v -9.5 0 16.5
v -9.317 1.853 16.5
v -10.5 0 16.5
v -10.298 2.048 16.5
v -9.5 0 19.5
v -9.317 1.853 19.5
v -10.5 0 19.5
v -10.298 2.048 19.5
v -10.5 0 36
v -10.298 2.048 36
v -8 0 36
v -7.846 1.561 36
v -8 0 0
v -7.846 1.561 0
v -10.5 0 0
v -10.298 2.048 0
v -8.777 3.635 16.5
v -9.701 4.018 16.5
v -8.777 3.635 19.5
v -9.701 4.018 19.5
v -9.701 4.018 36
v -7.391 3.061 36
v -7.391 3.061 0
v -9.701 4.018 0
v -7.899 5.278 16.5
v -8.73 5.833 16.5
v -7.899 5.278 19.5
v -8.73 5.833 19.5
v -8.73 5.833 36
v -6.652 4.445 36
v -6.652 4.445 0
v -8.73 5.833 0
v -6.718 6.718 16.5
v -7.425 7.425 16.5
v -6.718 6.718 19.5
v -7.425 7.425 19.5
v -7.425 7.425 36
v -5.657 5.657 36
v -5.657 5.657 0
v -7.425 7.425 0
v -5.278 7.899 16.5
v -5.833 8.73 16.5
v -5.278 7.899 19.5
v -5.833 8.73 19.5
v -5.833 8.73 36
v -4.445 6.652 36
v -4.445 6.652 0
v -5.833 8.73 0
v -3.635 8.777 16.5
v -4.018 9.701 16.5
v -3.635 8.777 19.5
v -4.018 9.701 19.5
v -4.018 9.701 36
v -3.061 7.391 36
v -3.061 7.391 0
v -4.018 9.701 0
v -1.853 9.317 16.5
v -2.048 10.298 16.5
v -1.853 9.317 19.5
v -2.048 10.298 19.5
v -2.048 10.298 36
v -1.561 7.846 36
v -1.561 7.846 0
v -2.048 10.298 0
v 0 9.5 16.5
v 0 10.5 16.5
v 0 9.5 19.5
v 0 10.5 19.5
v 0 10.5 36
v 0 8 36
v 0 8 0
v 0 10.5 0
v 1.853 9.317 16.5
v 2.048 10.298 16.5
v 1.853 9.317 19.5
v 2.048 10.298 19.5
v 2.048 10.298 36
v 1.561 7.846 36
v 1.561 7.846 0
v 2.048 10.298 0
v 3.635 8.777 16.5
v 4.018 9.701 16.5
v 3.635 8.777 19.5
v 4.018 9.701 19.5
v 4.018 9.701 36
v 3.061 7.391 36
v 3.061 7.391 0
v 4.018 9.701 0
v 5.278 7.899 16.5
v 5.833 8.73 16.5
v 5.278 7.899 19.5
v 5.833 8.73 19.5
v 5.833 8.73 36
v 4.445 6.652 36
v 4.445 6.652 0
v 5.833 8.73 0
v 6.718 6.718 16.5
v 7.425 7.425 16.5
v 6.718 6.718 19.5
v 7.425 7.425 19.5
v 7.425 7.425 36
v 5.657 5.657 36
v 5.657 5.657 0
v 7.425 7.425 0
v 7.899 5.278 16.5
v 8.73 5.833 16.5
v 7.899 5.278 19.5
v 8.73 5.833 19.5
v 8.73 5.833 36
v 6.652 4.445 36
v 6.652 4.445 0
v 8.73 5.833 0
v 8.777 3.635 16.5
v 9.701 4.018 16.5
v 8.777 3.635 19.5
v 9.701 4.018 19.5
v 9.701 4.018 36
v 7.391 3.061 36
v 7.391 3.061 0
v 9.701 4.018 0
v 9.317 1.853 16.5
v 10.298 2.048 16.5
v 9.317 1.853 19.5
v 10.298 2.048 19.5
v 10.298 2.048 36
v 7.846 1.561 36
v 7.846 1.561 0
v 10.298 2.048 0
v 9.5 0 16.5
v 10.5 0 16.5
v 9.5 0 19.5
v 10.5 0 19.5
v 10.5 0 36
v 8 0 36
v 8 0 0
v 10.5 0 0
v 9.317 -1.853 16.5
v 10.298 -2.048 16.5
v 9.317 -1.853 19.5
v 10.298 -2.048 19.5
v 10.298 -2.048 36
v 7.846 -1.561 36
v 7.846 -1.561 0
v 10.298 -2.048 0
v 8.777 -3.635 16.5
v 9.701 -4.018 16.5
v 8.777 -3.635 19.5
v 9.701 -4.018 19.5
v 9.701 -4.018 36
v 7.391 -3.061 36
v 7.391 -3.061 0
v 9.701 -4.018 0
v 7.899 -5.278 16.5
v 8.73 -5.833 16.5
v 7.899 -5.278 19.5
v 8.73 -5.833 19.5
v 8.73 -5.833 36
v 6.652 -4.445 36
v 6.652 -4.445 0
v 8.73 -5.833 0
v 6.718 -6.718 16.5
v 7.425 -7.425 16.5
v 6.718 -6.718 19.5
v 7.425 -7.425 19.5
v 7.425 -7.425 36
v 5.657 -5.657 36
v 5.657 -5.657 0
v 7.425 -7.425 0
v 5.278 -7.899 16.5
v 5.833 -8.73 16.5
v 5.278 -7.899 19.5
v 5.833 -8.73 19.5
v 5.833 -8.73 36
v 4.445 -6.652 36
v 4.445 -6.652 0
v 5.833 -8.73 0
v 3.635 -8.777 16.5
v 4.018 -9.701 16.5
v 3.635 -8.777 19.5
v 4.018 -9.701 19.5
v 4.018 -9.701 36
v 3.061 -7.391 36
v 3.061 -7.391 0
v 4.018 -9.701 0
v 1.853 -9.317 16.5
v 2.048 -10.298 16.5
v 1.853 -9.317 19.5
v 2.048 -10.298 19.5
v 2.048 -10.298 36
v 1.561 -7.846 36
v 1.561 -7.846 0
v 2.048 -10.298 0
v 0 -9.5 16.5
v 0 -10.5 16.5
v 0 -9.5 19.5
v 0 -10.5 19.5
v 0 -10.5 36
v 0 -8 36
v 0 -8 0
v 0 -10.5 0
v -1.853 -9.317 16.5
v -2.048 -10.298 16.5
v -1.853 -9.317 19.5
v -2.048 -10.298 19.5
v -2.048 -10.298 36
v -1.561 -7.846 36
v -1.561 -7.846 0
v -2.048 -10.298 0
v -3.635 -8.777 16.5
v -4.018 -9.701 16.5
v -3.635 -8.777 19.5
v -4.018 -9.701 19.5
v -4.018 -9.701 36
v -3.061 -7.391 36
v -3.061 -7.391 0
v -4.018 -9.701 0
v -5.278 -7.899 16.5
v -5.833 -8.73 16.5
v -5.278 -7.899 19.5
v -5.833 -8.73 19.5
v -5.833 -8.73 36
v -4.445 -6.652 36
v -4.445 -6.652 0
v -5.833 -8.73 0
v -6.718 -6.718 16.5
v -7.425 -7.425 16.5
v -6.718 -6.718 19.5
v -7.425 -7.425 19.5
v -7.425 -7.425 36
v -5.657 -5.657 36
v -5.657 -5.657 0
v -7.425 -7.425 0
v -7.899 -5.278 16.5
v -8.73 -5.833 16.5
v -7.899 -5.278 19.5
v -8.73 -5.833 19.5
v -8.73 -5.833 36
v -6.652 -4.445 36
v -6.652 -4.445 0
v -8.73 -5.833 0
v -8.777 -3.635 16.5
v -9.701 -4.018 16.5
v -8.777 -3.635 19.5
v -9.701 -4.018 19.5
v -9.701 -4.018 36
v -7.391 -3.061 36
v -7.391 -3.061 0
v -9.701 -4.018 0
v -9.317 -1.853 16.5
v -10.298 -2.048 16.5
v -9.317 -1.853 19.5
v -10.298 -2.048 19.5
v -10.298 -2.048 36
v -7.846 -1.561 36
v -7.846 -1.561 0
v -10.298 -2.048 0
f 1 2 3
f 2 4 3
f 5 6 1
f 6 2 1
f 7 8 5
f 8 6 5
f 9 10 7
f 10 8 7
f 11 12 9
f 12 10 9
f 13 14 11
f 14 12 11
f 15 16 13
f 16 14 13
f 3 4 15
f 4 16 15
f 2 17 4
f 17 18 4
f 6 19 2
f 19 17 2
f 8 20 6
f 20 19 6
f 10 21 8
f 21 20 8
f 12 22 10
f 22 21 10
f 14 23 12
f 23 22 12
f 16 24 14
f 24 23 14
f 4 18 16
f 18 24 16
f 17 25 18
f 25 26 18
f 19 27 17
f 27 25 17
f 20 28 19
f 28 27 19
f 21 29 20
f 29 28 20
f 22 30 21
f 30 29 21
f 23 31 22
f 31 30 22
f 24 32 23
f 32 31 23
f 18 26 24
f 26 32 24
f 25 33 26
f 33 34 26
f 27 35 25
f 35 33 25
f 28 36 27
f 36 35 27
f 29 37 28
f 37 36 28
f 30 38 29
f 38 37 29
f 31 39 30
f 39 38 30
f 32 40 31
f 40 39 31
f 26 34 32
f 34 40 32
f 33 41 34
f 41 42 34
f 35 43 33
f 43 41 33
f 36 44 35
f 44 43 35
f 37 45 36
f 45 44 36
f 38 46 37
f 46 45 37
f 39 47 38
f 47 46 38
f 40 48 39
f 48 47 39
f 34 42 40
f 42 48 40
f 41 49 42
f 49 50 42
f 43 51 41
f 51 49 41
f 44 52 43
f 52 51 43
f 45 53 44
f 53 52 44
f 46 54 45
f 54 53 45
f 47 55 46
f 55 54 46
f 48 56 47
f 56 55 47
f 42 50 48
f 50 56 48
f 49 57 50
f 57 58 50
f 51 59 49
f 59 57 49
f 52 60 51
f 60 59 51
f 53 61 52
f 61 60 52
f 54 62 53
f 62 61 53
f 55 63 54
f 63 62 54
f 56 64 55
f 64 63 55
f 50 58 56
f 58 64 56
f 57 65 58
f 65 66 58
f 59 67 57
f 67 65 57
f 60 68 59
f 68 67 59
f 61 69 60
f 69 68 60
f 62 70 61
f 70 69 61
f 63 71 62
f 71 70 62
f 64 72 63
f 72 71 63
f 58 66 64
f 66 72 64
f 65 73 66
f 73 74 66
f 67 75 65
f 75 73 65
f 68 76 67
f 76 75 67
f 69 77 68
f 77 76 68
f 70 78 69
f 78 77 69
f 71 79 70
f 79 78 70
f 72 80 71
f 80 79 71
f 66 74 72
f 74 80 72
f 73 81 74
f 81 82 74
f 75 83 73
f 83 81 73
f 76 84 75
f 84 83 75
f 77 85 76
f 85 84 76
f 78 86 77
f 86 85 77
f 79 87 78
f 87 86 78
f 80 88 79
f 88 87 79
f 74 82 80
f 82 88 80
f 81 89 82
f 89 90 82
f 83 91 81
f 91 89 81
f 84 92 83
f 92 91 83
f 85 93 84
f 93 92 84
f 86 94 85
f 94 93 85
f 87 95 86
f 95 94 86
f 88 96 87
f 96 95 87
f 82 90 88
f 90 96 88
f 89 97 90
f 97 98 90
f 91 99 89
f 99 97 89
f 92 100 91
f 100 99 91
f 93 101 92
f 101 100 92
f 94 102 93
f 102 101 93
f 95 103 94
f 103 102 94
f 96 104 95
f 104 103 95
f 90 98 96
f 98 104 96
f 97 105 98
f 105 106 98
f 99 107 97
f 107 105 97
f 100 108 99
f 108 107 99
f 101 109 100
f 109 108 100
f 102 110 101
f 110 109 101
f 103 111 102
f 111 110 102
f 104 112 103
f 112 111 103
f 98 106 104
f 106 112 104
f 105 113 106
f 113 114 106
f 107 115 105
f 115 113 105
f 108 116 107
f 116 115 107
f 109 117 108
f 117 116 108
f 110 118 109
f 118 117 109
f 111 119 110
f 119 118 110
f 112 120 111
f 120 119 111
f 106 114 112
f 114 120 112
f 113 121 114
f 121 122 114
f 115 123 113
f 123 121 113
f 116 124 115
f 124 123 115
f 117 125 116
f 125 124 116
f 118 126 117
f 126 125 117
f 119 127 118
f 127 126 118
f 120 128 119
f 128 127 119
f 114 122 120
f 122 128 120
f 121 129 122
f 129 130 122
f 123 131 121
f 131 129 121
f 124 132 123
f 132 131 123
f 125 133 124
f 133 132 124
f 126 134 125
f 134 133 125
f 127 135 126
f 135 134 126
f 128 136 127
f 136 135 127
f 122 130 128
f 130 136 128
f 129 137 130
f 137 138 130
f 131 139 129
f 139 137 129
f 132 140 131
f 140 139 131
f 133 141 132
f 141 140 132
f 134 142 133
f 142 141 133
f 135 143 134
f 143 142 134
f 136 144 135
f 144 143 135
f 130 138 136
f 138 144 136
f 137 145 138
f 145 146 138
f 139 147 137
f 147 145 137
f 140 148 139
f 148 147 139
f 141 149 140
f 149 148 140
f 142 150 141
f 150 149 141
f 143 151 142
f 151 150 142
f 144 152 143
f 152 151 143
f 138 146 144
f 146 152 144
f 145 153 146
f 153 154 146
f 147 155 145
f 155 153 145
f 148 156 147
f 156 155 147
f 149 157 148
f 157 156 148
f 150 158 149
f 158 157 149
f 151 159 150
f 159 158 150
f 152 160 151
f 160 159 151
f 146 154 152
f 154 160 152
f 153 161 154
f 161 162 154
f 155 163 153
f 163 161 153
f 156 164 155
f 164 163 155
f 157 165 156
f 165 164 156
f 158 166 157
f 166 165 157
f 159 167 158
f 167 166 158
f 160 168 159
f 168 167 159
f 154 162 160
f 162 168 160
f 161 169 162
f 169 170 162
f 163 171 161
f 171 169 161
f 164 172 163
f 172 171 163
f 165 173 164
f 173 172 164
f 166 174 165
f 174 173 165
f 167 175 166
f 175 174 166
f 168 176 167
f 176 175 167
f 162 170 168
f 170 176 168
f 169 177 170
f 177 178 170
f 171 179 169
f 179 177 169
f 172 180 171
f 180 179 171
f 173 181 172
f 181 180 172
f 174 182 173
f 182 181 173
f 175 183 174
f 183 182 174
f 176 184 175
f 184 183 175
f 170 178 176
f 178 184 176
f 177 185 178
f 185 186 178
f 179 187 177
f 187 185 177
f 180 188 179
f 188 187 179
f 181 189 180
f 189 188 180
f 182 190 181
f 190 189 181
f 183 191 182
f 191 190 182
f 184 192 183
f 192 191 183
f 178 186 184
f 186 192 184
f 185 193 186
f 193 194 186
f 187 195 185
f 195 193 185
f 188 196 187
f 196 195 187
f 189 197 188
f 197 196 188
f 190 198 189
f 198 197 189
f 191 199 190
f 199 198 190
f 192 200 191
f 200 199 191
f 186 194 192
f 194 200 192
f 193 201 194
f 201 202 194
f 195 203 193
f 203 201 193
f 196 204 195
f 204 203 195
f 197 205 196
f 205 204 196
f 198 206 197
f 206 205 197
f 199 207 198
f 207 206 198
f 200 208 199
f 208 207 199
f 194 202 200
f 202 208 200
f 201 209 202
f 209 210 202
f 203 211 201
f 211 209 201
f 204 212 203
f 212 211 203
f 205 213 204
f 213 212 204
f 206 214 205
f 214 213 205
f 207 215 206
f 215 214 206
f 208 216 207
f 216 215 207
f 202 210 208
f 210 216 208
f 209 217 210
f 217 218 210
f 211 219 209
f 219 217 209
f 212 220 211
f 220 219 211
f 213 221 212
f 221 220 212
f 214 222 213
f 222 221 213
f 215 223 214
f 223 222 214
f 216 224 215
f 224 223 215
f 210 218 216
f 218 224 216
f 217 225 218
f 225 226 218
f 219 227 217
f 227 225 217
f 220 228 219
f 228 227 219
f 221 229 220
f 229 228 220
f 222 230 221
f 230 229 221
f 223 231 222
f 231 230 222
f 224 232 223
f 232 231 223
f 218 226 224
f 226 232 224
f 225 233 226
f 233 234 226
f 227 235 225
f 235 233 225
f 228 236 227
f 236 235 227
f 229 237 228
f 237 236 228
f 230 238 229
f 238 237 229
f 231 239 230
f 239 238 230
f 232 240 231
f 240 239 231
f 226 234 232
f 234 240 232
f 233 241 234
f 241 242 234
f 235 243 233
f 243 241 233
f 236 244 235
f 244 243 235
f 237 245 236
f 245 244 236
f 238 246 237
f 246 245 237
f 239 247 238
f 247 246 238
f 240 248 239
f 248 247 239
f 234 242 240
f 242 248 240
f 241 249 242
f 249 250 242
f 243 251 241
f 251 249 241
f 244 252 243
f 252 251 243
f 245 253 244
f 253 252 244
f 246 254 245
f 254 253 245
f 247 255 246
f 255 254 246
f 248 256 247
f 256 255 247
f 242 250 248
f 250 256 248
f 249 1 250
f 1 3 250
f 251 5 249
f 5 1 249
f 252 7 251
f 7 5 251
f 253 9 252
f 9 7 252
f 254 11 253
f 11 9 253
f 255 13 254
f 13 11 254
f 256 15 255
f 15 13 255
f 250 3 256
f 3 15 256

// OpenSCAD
$fn = 32;

// ----------------------------------------------------------------------
// Grooved revolve: stepped, bore R8
// ----------------------------------------------------------------------

// --- parameters (mm) ---
bore_r = 8;               // bore radius
outer_r = 10.5;           // outer radius of the body
total_h = 36;             // overall height, Z
wall = 2.5;               // radial wall thickness
groove_w = 3;             // groove width
groove_d = 1;             // groove depth
grooves = 1;              // number of outer grooves
fit_tol = 0.1;            // declared fit tolerance (prompt contract)
free_tol = 0.5;           // declared free tolerance (prompt contract)

bbox_x = 2 * outer_r;  // full diameter
bore_d = 2 * bore_r;  // bore diameter
body_d = 2 * outer_r;  // body diameter
revolve_angle = 360;  // full turn around the Z axis

profile = [[8, 0], [10.5, 0], [10.5, 16.5], [9.5, 16.5], [9.5, 19.5], [10.5, 19.5], [10.5, 36], [8, 36]];  // primary outline, 8 points, counter clockwise

// --- the one profile operation ---
rotate_extrude(angle = revolve_angle) polygon(points = profile);
